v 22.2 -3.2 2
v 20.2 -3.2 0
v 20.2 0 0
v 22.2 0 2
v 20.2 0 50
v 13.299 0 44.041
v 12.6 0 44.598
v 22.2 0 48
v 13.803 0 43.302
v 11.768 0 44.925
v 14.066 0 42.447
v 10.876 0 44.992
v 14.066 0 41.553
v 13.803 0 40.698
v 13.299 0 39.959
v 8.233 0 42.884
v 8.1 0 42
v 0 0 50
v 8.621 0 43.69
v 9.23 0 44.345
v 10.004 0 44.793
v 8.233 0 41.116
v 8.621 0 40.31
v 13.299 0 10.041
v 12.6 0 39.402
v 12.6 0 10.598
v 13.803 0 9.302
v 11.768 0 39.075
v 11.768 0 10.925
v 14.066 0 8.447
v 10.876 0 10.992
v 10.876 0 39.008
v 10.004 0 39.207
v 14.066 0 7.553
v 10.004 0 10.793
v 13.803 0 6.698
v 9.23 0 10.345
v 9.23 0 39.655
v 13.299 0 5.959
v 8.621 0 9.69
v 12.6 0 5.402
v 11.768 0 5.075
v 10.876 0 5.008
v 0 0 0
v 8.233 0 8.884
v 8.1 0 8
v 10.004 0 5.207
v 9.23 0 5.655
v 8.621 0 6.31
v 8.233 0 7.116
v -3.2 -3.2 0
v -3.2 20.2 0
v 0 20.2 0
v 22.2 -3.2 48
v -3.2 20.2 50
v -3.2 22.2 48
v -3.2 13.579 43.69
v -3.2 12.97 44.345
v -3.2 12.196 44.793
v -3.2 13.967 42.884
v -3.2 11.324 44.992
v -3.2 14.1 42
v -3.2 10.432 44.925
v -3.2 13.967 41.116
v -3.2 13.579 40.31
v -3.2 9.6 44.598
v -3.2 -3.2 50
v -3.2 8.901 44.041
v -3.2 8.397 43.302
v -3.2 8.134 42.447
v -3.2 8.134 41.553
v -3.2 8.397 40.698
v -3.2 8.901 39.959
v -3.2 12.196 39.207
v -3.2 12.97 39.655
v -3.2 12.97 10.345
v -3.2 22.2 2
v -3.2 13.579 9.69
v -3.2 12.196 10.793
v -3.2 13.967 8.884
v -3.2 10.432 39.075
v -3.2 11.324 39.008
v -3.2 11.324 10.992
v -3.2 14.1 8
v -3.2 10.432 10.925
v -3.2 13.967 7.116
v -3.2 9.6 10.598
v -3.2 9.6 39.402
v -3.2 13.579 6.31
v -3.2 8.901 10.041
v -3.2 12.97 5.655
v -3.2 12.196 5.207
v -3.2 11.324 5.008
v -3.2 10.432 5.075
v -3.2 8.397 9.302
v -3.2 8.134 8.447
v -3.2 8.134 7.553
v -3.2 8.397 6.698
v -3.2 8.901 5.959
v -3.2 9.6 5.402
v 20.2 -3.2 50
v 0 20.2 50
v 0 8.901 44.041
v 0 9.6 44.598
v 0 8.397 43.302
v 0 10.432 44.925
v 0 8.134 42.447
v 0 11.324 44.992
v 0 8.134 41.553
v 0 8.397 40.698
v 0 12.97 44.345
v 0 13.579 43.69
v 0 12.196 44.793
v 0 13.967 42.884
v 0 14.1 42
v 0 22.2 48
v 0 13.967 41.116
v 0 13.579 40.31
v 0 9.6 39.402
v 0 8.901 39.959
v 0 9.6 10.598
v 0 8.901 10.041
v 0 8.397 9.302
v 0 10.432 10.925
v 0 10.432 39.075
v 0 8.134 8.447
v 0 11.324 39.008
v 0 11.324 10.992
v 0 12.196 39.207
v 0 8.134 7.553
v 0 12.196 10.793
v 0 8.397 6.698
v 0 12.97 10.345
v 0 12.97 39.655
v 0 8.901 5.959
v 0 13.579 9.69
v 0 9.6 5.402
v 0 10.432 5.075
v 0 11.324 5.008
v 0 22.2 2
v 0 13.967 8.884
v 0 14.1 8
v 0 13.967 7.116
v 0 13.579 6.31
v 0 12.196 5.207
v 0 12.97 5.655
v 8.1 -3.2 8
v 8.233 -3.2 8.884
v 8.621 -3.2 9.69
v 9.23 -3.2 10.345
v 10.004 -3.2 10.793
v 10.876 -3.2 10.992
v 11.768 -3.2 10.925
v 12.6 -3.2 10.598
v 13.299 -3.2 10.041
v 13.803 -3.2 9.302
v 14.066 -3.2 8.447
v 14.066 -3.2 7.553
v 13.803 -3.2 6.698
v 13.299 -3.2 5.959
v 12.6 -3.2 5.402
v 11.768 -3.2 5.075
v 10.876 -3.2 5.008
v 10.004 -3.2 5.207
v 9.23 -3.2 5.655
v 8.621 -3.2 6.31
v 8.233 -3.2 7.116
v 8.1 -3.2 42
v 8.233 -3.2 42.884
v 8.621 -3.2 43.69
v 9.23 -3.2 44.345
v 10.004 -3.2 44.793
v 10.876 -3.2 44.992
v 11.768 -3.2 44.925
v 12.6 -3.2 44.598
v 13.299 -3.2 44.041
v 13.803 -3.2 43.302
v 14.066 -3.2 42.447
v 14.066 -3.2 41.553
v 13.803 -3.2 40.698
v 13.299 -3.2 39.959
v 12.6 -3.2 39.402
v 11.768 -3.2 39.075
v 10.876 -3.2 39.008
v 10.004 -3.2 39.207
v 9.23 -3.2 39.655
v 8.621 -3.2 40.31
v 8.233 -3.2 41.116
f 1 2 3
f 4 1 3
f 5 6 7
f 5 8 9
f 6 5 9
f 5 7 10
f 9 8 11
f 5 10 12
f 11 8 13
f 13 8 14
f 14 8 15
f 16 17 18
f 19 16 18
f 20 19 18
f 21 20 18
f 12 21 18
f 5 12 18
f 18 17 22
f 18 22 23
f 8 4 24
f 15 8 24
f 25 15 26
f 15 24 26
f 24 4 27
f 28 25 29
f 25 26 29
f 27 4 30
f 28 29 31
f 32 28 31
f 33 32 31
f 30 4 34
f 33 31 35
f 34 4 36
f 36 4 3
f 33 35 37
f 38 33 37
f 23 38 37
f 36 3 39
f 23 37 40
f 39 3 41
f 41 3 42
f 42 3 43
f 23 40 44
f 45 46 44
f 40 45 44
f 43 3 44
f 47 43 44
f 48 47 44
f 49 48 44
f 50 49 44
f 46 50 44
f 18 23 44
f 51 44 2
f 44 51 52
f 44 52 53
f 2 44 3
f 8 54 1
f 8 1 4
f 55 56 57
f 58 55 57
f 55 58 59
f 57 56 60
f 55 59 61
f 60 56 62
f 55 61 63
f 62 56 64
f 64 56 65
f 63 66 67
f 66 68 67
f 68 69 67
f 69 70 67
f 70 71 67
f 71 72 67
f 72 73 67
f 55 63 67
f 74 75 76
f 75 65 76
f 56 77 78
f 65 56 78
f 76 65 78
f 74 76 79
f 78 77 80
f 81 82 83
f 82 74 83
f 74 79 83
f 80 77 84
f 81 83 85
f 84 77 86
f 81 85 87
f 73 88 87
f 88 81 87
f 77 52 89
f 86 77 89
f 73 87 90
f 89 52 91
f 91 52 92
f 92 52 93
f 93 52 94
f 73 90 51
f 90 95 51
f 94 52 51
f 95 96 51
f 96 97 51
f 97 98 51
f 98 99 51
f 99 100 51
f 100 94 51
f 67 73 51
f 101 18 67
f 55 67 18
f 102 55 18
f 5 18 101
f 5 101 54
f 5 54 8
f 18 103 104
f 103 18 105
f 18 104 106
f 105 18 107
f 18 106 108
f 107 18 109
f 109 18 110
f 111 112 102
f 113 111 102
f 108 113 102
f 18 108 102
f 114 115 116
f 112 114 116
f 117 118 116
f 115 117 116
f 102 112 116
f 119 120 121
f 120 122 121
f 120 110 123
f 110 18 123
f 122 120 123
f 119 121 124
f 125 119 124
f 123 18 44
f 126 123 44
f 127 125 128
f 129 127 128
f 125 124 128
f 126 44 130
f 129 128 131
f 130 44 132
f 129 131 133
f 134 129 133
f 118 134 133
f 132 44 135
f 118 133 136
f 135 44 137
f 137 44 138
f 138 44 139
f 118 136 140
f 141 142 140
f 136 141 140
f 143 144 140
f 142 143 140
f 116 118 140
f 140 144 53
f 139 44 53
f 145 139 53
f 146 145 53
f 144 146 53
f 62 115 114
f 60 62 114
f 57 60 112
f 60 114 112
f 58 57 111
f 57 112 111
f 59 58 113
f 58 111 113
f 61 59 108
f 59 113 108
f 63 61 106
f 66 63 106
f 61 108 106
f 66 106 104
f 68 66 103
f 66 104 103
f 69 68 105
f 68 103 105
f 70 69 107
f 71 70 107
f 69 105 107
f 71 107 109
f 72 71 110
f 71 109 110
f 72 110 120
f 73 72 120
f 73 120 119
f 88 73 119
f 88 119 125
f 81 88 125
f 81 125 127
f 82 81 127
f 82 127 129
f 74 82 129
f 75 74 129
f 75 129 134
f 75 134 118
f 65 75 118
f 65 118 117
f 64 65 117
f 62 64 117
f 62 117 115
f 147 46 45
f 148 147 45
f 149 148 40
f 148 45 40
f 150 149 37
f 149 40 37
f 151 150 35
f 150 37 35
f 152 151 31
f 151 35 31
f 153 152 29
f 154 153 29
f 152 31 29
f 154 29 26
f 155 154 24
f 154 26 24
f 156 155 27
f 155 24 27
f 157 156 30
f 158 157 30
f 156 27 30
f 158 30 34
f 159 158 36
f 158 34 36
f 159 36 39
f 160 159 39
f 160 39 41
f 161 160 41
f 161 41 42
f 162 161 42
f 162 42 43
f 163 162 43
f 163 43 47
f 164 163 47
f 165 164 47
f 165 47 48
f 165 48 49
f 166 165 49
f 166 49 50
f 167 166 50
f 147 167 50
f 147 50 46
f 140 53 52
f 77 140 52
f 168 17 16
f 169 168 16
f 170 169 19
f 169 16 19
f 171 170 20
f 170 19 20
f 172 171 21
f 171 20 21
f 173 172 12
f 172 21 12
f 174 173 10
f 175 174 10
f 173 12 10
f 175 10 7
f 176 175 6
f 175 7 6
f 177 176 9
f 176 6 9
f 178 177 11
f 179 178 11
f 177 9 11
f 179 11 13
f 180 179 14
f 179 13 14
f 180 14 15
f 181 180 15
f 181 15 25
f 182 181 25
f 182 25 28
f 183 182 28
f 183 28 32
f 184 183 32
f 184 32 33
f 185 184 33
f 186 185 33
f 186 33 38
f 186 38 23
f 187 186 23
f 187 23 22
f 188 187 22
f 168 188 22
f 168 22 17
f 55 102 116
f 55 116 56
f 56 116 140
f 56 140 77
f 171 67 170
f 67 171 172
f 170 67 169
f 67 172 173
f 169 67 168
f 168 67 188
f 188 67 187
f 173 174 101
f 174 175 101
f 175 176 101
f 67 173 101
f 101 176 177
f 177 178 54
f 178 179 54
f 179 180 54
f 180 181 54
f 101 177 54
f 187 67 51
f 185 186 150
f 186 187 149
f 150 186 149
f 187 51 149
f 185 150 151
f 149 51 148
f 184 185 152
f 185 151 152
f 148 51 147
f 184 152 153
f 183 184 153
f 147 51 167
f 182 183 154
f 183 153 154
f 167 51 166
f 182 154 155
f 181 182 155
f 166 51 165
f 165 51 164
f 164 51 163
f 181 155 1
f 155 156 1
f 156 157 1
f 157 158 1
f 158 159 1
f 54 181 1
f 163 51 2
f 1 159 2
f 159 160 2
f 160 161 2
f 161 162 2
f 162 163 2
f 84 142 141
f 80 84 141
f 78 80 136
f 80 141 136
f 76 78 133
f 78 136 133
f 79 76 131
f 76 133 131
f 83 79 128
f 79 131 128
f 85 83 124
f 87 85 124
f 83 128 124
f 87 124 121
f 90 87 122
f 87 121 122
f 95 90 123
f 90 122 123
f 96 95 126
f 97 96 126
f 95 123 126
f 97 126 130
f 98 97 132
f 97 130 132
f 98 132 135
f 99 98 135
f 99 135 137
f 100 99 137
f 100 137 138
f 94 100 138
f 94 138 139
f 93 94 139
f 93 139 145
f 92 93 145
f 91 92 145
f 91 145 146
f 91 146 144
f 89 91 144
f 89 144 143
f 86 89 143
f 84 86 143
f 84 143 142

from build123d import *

# Parameters (mm, degrees)
RESSALTO_EXTRUS_O1_DEPTH = 50
CHANFRO1_SIZE            = 2
ESBO_O2_R                = 3
CORTE_EXTRUS_O1_DEPTH    = 60.039647695
ESBO_O3_R                = 3
CORTE_EXTRUS_O2_DEPTH    = 60.039647695


with BuildPart() as part:
    # Esboço1 → Ressalto-extrusão1 (new body)
    with BuildSketch(Plane.XY):
        Polygon((0, 0), (0, 22.2), (-3.2, 22.2), (-3.2, -3.2), (22.2, -3.2), (22.2, 0), align=None)
    extrude(amount=RESSALTO_EXTRUS_O1_DEPTH)

    # Chanfro1
    chanfro1_edges = [part.edges().sort_by_distance(p)[0] for p in [
        (-1.6, 22.2, 50),
        (22.2, -1.6, 50),
        (22.2, -1.6, 0),
        (-1.6, 22.2, 0),
    ]]
    chamfer(chanfro1_edges, length=CHANFRO1_SIZE)

    # Esboço2 → Corte-extrusão1 (cut, through all)
    with BuildSketch(Plane(origin=(0, 0, 0), x_dir=(1, 0, 0), z_dir=(0, 1, 0))):
        with Locations(Location((11.1, -8, 0), (0, 0, 180))):
            Circle(ESBO_O2_R)
        with Locations(Location((11.1, -42, 0), (0, 0, 180))):
            Circle(ESBO_O2_R)
    extrude(amount=-CORTE_EXTRUS_O1_DEPTH, mode=Mode.SUBTRACT)

    # Esboço3 → Corte-extrusão2 (cut, through all)
    with BuildSketch(Plane(origin=(0, 0, 0), x_dir=(0, 0, -1), z_dir=(1, 0, 0))):
        with Locations(Location((-42, 11.1, 0), (0, 0, 90))):
            Circle(ESBO_O3_R)
        with Locations(Location((-8, 11.1, 0), (0, 0, 90))):
            Circle(ESBO_O3_R)
    extrude(amount=-CORTE_EXTRUS_O2_DEPTH, mode=Mode.SUBTRACT)


solid = part.part
